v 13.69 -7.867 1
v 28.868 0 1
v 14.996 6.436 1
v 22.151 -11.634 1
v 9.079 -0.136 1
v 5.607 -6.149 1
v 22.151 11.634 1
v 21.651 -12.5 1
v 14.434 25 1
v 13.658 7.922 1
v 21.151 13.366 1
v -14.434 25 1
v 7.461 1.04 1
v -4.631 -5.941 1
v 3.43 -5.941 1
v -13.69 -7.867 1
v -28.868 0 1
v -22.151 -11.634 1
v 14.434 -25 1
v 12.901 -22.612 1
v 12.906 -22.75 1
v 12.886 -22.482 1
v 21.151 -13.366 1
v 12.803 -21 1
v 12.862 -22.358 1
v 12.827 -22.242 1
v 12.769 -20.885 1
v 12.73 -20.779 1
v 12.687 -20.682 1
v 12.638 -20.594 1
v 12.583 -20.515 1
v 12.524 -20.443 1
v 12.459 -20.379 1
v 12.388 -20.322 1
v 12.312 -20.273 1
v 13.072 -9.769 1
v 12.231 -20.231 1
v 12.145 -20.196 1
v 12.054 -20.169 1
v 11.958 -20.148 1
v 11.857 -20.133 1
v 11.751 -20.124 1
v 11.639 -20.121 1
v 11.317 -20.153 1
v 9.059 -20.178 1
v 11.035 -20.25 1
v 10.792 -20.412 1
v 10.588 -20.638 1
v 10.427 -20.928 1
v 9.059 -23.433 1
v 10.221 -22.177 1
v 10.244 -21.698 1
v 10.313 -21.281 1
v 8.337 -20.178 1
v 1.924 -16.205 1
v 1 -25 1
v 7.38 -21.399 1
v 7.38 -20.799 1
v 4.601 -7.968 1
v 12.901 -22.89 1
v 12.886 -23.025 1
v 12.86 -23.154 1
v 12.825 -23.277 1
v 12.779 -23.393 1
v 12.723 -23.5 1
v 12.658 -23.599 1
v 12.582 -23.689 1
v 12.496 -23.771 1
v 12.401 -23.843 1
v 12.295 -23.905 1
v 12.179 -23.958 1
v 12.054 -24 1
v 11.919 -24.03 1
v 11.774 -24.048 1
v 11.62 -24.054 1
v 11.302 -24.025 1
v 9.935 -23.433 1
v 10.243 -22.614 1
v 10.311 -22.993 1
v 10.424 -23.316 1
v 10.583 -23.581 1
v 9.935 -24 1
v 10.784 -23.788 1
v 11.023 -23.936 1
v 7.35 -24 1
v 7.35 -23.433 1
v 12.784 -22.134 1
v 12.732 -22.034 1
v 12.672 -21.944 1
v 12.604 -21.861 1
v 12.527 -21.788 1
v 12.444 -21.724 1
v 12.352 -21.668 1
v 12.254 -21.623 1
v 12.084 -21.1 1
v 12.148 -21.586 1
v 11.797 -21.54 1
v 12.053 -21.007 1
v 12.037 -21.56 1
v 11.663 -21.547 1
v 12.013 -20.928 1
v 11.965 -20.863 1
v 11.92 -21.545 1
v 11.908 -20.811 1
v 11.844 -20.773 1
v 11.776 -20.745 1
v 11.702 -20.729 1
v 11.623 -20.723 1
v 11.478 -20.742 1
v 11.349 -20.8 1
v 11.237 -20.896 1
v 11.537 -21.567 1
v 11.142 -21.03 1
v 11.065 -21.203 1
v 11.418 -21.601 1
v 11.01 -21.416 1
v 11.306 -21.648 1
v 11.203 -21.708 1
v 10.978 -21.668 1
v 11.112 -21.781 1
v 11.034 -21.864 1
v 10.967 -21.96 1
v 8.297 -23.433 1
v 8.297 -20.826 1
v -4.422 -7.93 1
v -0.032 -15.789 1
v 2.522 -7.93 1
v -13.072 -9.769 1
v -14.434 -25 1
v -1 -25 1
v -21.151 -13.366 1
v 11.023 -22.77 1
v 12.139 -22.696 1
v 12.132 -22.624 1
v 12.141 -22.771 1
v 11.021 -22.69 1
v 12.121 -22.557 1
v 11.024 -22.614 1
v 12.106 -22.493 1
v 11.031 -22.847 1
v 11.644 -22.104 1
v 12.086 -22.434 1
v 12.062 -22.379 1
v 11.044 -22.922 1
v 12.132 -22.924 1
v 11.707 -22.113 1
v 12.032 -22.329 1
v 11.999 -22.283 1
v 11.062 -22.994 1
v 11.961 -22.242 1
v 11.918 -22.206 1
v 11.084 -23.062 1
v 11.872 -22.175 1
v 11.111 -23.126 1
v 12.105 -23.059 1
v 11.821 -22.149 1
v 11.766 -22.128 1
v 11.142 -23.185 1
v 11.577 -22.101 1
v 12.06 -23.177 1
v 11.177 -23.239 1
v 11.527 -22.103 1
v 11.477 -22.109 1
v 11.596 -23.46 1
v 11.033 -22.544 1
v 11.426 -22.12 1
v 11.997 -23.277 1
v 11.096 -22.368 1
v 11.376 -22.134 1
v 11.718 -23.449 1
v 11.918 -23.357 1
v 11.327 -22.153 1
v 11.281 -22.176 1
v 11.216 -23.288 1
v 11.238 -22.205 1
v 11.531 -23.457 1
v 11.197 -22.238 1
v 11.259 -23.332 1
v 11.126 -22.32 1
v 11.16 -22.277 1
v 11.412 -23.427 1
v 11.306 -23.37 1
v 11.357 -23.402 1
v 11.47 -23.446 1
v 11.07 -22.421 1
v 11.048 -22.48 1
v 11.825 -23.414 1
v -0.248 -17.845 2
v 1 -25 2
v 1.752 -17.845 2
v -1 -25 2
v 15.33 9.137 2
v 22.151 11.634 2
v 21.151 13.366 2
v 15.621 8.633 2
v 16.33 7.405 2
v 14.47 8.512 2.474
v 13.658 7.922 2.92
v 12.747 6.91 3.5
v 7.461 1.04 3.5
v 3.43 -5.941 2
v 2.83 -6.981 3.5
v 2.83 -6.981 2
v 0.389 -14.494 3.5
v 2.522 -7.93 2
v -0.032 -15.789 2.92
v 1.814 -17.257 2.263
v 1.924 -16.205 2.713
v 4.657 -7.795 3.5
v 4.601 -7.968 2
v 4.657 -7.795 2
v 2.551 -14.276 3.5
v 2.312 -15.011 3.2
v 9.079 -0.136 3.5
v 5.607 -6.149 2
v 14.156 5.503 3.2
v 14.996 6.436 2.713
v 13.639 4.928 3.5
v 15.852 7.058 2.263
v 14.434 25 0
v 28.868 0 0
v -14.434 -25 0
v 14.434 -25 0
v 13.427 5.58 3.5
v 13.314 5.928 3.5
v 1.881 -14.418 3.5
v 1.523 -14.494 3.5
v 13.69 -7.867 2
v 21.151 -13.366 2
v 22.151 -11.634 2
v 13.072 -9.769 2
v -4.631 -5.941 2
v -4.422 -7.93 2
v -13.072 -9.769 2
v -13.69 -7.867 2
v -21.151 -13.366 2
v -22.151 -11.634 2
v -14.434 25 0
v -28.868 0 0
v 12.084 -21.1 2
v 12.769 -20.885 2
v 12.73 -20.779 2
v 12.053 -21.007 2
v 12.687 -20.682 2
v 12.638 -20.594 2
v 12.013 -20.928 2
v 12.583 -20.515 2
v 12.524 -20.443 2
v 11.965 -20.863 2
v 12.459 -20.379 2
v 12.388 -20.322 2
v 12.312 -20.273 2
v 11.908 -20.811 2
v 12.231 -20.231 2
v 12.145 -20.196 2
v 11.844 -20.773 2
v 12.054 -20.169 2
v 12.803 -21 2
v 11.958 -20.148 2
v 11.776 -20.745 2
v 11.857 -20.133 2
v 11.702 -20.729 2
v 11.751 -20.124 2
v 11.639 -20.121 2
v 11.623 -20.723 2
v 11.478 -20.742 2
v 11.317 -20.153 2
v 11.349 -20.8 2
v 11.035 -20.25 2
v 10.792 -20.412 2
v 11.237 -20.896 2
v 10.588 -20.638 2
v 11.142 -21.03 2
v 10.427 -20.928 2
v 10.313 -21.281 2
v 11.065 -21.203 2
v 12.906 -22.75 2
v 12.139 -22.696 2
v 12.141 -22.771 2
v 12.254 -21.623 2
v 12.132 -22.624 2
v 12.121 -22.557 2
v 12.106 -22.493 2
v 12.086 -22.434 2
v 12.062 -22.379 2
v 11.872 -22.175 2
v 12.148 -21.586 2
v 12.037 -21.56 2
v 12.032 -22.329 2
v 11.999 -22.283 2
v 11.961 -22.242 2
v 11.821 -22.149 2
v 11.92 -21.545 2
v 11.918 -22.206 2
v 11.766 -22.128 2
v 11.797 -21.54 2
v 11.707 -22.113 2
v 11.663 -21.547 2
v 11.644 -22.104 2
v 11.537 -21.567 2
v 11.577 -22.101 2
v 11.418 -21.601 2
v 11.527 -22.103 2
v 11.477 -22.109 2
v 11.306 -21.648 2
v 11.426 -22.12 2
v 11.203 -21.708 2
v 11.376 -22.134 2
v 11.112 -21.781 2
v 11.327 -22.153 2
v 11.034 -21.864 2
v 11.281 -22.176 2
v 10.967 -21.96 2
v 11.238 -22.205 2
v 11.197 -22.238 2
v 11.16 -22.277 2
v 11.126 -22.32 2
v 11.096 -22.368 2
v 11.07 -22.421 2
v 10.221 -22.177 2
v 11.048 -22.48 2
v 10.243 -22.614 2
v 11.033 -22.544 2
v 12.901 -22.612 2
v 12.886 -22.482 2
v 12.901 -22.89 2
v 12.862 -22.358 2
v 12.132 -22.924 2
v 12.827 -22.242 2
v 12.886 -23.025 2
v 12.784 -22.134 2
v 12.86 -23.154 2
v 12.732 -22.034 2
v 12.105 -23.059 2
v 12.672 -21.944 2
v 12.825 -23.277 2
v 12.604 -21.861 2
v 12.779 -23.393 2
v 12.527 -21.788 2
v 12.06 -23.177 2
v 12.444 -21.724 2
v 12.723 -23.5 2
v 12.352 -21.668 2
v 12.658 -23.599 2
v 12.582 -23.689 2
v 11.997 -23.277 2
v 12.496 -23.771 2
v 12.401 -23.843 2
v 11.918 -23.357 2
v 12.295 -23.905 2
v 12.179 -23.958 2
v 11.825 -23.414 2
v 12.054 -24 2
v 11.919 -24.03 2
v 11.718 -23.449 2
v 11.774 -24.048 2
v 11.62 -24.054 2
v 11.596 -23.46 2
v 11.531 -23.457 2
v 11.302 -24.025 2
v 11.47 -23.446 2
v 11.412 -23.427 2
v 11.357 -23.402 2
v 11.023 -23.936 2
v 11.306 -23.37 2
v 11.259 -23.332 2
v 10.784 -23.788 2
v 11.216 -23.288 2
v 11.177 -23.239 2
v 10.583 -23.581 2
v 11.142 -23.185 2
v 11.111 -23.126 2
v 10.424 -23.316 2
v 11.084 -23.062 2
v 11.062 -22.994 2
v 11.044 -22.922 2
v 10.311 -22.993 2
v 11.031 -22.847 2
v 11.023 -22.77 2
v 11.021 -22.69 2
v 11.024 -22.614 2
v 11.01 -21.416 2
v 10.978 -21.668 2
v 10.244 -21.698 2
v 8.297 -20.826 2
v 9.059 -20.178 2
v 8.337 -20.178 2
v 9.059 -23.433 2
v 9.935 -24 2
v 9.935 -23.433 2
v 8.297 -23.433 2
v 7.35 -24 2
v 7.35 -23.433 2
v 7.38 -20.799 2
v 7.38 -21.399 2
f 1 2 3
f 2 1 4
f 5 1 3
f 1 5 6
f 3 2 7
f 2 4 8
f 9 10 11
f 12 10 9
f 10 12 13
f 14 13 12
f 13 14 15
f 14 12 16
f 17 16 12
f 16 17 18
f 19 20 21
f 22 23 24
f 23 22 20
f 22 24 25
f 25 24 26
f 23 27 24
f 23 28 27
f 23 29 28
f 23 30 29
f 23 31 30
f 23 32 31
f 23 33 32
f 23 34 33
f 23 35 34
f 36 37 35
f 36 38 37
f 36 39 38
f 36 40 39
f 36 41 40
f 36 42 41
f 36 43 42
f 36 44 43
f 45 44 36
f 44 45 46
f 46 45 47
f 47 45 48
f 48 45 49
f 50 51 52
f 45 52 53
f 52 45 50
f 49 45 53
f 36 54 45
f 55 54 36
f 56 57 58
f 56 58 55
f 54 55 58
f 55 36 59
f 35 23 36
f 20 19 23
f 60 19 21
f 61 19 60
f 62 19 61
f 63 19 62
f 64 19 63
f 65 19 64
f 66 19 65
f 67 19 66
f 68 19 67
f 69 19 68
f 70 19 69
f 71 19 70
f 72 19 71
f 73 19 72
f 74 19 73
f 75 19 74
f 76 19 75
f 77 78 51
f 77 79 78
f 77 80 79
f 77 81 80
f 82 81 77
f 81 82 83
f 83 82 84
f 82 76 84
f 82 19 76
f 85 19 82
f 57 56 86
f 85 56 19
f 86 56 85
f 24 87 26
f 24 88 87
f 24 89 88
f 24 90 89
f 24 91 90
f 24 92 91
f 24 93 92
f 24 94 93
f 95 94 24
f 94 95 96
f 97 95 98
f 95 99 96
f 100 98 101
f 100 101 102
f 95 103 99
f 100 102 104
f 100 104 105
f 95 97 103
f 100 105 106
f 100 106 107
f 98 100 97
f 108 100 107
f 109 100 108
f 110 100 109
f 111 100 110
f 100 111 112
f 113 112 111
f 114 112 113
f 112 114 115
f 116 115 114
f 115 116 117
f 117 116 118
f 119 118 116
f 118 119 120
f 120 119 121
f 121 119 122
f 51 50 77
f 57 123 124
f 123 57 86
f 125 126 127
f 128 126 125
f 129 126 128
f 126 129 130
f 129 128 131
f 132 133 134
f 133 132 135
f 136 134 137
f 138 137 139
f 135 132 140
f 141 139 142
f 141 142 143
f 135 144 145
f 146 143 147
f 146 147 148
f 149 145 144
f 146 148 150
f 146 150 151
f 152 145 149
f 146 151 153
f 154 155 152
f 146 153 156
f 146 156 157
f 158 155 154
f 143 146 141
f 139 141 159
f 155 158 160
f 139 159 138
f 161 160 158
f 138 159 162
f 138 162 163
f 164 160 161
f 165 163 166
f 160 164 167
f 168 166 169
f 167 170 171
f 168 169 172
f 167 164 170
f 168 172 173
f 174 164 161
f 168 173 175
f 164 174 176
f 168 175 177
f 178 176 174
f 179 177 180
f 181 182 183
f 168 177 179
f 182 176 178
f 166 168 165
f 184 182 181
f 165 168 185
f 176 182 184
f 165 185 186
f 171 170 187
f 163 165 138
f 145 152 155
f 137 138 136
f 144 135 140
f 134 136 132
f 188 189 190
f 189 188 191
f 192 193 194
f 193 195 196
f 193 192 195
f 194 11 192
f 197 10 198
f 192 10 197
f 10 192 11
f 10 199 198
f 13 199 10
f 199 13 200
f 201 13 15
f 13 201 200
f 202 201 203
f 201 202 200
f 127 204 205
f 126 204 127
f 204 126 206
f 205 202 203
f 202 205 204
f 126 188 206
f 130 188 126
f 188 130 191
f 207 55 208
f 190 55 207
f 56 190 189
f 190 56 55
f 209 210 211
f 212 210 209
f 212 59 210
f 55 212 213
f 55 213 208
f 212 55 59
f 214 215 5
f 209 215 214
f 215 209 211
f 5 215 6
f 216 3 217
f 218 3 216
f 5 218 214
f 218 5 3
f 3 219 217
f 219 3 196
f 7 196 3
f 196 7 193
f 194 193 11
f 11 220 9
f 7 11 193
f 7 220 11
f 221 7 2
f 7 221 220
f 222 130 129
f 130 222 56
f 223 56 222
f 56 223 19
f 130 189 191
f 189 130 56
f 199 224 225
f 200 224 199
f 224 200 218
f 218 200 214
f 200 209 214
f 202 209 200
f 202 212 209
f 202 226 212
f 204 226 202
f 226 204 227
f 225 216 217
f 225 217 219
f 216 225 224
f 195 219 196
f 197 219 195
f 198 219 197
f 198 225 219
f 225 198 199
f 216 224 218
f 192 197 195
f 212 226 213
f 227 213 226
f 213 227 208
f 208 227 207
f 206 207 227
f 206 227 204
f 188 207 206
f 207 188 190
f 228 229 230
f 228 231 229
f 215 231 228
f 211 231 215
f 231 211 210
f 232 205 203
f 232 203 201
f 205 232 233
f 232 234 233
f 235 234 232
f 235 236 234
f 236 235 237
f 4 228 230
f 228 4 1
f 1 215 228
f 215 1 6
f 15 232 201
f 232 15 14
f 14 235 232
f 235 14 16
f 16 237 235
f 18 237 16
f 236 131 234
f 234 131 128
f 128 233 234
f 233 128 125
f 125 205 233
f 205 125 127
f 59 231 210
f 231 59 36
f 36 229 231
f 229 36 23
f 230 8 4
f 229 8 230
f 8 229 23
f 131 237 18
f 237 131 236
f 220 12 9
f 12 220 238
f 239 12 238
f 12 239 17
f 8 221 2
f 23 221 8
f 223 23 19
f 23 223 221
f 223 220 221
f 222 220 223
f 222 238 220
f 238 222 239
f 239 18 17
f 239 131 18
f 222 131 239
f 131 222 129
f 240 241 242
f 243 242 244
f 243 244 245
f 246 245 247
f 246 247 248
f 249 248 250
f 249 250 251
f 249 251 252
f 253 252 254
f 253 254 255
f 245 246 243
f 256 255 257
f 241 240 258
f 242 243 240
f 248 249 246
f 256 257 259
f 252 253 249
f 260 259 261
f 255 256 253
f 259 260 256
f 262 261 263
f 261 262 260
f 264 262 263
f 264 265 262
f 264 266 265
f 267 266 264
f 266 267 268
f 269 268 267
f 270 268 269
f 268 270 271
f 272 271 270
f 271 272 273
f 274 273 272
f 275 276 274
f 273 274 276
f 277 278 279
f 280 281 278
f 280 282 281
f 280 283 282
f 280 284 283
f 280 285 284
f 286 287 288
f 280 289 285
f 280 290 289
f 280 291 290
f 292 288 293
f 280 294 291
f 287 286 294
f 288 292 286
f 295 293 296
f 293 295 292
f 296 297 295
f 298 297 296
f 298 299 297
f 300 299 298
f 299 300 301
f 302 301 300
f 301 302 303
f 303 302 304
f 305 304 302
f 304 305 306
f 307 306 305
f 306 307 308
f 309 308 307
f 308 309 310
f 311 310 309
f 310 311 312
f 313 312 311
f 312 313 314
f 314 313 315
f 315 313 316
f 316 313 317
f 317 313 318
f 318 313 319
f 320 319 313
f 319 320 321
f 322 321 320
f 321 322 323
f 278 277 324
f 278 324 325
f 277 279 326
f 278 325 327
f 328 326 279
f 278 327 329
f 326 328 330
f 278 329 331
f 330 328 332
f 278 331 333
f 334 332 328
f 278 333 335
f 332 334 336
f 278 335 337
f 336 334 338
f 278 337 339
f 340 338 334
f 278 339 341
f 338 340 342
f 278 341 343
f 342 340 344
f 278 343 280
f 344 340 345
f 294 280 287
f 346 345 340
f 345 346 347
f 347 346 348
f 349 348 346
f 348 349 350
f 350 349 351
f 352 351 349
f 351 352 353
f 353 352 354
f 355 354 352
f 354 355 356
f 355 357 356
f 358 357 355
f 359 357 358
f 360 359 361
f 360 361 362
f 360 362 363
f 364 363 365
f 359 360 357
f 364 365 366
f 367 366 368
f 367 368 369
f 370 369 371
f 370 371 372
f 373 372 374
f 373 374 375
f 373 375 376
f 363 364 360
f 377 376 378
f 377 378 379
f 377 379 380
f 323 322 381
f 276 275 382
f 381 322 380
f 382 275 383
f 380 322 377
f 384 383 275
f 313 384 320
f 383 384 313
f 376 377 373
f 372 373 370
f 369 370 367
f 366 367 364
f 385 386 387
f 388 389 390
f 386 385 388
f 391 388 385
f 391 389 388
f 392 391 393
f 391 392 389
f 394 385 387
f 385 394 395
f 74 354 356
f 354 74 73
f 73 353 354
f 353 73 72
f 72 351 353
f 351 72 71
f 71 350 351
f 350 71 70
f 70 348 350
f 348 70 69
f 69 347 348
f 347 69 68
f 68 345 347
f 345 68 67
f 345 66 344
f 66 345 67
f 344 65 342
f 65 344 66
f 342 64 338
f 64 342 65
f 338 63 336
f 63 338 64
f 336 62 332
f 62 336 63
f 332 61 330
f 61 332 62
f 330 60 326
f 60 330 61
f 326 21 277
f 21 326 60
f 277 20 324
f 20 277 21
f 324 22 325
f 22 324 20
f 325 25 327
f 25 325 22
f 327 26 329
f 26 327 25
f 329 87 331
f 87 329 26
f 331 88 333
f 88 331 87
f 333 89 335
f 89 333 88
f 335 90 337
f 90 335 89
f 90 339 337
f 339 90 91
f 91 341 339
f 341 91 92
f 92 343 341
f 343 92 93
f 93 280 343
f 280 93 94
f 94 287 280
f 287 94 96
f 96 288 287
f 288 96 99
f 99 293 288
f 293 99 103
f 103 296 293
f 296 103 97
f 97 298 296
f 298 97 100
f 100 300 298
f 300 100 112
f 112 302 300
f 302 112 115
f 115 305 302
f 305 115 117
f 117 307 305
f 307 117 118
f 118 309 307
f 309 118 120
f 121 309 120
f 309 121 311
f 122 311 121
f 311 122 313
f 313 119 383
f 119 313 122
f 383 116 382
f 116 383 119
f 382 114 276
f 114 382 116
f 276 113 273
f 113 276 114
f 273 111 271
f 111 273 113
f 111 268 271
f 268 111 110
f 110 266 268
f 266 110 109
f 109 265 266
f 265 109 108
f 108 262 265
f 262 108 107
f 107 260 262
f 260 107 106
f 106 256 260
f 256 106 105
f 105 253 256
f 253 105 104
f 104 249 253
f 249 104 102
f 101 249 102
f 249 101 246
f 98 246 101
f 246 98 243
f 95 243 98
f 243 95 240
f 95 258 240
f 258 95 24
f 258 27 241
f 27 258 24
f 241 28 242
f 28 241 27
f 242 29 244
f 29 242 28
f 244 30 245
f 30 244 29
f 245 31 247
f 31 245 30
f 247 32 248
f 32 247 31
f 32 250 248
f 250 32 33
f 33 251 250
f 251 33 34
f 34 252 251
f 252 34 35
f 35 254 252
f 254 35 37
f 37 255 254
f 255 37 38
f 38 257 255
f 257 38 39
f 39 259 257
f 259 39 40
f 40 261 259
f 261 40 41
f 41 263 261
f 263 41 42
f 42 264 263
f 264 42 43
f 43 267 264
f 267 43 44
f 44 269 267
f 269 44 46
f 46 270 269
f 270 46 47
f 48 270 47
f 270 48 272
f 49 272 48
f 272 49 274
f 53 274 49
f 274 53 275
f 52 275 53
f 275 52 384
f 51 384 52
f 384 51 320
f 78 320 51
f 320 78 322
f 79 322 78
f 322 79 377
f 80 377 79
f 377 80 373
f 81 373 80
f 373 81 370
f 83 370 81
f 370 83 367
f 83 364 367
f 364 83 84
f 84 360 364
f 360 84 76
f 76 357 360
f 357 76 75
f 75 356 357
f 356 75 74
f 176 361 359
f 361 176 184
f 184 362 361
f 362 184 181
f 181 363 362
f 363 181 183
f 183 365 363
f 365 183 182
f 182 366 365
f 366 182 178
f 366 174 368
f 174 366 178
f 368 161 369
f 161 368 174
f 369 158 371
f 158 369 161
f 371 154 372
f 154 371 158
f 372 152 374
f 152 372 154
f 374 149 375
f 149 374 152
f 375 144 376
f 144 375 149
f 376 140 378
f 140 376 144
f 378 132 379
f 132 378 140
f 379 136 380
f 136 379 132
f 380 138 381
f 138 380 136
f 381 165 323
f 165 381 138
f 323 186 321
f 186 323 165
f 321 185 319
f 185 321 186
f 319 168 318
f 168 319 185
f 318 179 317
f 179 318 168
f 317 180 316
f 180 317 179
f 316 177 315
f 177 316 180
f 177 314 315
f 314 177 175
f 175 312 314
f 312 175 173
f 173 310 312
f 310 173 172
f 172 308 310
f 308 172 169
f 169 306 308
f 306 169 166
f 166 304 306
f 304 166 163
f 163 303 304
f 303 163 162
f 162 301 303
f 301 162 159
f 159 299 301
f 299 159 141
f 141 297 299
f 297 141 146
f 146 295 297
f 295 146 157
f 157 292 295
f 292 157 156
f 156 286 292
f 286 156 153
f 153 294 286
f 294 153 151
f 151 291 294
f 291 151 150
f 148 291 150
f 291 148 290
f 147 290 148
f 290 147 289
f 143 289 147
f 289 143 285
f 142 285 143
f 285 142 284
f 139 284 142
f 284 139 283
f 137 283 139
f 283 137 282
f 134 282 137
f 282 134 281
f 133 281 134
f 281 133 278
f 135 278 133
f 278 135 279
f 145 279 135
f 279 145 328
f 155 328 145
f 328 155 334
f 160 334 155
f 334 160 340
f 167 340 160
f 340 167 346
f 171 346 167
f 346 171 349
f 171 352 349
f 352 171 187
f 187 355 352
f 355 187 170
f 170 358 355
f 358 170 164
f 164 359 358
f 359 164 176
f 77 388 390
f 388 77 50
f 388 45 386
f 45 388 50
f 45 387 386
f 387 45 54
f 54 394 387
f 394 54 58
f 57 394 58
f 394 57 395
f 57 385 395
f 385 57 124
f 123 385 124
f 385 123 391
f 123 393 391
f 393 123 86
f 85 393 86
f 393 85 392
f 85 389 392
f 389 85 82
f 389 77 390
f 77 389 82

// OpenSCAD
include <18xx tiles basic functions.scad>
hex("Green");
put_tilenr("16");
light_curve_bridge();
light_curve(r=5);
